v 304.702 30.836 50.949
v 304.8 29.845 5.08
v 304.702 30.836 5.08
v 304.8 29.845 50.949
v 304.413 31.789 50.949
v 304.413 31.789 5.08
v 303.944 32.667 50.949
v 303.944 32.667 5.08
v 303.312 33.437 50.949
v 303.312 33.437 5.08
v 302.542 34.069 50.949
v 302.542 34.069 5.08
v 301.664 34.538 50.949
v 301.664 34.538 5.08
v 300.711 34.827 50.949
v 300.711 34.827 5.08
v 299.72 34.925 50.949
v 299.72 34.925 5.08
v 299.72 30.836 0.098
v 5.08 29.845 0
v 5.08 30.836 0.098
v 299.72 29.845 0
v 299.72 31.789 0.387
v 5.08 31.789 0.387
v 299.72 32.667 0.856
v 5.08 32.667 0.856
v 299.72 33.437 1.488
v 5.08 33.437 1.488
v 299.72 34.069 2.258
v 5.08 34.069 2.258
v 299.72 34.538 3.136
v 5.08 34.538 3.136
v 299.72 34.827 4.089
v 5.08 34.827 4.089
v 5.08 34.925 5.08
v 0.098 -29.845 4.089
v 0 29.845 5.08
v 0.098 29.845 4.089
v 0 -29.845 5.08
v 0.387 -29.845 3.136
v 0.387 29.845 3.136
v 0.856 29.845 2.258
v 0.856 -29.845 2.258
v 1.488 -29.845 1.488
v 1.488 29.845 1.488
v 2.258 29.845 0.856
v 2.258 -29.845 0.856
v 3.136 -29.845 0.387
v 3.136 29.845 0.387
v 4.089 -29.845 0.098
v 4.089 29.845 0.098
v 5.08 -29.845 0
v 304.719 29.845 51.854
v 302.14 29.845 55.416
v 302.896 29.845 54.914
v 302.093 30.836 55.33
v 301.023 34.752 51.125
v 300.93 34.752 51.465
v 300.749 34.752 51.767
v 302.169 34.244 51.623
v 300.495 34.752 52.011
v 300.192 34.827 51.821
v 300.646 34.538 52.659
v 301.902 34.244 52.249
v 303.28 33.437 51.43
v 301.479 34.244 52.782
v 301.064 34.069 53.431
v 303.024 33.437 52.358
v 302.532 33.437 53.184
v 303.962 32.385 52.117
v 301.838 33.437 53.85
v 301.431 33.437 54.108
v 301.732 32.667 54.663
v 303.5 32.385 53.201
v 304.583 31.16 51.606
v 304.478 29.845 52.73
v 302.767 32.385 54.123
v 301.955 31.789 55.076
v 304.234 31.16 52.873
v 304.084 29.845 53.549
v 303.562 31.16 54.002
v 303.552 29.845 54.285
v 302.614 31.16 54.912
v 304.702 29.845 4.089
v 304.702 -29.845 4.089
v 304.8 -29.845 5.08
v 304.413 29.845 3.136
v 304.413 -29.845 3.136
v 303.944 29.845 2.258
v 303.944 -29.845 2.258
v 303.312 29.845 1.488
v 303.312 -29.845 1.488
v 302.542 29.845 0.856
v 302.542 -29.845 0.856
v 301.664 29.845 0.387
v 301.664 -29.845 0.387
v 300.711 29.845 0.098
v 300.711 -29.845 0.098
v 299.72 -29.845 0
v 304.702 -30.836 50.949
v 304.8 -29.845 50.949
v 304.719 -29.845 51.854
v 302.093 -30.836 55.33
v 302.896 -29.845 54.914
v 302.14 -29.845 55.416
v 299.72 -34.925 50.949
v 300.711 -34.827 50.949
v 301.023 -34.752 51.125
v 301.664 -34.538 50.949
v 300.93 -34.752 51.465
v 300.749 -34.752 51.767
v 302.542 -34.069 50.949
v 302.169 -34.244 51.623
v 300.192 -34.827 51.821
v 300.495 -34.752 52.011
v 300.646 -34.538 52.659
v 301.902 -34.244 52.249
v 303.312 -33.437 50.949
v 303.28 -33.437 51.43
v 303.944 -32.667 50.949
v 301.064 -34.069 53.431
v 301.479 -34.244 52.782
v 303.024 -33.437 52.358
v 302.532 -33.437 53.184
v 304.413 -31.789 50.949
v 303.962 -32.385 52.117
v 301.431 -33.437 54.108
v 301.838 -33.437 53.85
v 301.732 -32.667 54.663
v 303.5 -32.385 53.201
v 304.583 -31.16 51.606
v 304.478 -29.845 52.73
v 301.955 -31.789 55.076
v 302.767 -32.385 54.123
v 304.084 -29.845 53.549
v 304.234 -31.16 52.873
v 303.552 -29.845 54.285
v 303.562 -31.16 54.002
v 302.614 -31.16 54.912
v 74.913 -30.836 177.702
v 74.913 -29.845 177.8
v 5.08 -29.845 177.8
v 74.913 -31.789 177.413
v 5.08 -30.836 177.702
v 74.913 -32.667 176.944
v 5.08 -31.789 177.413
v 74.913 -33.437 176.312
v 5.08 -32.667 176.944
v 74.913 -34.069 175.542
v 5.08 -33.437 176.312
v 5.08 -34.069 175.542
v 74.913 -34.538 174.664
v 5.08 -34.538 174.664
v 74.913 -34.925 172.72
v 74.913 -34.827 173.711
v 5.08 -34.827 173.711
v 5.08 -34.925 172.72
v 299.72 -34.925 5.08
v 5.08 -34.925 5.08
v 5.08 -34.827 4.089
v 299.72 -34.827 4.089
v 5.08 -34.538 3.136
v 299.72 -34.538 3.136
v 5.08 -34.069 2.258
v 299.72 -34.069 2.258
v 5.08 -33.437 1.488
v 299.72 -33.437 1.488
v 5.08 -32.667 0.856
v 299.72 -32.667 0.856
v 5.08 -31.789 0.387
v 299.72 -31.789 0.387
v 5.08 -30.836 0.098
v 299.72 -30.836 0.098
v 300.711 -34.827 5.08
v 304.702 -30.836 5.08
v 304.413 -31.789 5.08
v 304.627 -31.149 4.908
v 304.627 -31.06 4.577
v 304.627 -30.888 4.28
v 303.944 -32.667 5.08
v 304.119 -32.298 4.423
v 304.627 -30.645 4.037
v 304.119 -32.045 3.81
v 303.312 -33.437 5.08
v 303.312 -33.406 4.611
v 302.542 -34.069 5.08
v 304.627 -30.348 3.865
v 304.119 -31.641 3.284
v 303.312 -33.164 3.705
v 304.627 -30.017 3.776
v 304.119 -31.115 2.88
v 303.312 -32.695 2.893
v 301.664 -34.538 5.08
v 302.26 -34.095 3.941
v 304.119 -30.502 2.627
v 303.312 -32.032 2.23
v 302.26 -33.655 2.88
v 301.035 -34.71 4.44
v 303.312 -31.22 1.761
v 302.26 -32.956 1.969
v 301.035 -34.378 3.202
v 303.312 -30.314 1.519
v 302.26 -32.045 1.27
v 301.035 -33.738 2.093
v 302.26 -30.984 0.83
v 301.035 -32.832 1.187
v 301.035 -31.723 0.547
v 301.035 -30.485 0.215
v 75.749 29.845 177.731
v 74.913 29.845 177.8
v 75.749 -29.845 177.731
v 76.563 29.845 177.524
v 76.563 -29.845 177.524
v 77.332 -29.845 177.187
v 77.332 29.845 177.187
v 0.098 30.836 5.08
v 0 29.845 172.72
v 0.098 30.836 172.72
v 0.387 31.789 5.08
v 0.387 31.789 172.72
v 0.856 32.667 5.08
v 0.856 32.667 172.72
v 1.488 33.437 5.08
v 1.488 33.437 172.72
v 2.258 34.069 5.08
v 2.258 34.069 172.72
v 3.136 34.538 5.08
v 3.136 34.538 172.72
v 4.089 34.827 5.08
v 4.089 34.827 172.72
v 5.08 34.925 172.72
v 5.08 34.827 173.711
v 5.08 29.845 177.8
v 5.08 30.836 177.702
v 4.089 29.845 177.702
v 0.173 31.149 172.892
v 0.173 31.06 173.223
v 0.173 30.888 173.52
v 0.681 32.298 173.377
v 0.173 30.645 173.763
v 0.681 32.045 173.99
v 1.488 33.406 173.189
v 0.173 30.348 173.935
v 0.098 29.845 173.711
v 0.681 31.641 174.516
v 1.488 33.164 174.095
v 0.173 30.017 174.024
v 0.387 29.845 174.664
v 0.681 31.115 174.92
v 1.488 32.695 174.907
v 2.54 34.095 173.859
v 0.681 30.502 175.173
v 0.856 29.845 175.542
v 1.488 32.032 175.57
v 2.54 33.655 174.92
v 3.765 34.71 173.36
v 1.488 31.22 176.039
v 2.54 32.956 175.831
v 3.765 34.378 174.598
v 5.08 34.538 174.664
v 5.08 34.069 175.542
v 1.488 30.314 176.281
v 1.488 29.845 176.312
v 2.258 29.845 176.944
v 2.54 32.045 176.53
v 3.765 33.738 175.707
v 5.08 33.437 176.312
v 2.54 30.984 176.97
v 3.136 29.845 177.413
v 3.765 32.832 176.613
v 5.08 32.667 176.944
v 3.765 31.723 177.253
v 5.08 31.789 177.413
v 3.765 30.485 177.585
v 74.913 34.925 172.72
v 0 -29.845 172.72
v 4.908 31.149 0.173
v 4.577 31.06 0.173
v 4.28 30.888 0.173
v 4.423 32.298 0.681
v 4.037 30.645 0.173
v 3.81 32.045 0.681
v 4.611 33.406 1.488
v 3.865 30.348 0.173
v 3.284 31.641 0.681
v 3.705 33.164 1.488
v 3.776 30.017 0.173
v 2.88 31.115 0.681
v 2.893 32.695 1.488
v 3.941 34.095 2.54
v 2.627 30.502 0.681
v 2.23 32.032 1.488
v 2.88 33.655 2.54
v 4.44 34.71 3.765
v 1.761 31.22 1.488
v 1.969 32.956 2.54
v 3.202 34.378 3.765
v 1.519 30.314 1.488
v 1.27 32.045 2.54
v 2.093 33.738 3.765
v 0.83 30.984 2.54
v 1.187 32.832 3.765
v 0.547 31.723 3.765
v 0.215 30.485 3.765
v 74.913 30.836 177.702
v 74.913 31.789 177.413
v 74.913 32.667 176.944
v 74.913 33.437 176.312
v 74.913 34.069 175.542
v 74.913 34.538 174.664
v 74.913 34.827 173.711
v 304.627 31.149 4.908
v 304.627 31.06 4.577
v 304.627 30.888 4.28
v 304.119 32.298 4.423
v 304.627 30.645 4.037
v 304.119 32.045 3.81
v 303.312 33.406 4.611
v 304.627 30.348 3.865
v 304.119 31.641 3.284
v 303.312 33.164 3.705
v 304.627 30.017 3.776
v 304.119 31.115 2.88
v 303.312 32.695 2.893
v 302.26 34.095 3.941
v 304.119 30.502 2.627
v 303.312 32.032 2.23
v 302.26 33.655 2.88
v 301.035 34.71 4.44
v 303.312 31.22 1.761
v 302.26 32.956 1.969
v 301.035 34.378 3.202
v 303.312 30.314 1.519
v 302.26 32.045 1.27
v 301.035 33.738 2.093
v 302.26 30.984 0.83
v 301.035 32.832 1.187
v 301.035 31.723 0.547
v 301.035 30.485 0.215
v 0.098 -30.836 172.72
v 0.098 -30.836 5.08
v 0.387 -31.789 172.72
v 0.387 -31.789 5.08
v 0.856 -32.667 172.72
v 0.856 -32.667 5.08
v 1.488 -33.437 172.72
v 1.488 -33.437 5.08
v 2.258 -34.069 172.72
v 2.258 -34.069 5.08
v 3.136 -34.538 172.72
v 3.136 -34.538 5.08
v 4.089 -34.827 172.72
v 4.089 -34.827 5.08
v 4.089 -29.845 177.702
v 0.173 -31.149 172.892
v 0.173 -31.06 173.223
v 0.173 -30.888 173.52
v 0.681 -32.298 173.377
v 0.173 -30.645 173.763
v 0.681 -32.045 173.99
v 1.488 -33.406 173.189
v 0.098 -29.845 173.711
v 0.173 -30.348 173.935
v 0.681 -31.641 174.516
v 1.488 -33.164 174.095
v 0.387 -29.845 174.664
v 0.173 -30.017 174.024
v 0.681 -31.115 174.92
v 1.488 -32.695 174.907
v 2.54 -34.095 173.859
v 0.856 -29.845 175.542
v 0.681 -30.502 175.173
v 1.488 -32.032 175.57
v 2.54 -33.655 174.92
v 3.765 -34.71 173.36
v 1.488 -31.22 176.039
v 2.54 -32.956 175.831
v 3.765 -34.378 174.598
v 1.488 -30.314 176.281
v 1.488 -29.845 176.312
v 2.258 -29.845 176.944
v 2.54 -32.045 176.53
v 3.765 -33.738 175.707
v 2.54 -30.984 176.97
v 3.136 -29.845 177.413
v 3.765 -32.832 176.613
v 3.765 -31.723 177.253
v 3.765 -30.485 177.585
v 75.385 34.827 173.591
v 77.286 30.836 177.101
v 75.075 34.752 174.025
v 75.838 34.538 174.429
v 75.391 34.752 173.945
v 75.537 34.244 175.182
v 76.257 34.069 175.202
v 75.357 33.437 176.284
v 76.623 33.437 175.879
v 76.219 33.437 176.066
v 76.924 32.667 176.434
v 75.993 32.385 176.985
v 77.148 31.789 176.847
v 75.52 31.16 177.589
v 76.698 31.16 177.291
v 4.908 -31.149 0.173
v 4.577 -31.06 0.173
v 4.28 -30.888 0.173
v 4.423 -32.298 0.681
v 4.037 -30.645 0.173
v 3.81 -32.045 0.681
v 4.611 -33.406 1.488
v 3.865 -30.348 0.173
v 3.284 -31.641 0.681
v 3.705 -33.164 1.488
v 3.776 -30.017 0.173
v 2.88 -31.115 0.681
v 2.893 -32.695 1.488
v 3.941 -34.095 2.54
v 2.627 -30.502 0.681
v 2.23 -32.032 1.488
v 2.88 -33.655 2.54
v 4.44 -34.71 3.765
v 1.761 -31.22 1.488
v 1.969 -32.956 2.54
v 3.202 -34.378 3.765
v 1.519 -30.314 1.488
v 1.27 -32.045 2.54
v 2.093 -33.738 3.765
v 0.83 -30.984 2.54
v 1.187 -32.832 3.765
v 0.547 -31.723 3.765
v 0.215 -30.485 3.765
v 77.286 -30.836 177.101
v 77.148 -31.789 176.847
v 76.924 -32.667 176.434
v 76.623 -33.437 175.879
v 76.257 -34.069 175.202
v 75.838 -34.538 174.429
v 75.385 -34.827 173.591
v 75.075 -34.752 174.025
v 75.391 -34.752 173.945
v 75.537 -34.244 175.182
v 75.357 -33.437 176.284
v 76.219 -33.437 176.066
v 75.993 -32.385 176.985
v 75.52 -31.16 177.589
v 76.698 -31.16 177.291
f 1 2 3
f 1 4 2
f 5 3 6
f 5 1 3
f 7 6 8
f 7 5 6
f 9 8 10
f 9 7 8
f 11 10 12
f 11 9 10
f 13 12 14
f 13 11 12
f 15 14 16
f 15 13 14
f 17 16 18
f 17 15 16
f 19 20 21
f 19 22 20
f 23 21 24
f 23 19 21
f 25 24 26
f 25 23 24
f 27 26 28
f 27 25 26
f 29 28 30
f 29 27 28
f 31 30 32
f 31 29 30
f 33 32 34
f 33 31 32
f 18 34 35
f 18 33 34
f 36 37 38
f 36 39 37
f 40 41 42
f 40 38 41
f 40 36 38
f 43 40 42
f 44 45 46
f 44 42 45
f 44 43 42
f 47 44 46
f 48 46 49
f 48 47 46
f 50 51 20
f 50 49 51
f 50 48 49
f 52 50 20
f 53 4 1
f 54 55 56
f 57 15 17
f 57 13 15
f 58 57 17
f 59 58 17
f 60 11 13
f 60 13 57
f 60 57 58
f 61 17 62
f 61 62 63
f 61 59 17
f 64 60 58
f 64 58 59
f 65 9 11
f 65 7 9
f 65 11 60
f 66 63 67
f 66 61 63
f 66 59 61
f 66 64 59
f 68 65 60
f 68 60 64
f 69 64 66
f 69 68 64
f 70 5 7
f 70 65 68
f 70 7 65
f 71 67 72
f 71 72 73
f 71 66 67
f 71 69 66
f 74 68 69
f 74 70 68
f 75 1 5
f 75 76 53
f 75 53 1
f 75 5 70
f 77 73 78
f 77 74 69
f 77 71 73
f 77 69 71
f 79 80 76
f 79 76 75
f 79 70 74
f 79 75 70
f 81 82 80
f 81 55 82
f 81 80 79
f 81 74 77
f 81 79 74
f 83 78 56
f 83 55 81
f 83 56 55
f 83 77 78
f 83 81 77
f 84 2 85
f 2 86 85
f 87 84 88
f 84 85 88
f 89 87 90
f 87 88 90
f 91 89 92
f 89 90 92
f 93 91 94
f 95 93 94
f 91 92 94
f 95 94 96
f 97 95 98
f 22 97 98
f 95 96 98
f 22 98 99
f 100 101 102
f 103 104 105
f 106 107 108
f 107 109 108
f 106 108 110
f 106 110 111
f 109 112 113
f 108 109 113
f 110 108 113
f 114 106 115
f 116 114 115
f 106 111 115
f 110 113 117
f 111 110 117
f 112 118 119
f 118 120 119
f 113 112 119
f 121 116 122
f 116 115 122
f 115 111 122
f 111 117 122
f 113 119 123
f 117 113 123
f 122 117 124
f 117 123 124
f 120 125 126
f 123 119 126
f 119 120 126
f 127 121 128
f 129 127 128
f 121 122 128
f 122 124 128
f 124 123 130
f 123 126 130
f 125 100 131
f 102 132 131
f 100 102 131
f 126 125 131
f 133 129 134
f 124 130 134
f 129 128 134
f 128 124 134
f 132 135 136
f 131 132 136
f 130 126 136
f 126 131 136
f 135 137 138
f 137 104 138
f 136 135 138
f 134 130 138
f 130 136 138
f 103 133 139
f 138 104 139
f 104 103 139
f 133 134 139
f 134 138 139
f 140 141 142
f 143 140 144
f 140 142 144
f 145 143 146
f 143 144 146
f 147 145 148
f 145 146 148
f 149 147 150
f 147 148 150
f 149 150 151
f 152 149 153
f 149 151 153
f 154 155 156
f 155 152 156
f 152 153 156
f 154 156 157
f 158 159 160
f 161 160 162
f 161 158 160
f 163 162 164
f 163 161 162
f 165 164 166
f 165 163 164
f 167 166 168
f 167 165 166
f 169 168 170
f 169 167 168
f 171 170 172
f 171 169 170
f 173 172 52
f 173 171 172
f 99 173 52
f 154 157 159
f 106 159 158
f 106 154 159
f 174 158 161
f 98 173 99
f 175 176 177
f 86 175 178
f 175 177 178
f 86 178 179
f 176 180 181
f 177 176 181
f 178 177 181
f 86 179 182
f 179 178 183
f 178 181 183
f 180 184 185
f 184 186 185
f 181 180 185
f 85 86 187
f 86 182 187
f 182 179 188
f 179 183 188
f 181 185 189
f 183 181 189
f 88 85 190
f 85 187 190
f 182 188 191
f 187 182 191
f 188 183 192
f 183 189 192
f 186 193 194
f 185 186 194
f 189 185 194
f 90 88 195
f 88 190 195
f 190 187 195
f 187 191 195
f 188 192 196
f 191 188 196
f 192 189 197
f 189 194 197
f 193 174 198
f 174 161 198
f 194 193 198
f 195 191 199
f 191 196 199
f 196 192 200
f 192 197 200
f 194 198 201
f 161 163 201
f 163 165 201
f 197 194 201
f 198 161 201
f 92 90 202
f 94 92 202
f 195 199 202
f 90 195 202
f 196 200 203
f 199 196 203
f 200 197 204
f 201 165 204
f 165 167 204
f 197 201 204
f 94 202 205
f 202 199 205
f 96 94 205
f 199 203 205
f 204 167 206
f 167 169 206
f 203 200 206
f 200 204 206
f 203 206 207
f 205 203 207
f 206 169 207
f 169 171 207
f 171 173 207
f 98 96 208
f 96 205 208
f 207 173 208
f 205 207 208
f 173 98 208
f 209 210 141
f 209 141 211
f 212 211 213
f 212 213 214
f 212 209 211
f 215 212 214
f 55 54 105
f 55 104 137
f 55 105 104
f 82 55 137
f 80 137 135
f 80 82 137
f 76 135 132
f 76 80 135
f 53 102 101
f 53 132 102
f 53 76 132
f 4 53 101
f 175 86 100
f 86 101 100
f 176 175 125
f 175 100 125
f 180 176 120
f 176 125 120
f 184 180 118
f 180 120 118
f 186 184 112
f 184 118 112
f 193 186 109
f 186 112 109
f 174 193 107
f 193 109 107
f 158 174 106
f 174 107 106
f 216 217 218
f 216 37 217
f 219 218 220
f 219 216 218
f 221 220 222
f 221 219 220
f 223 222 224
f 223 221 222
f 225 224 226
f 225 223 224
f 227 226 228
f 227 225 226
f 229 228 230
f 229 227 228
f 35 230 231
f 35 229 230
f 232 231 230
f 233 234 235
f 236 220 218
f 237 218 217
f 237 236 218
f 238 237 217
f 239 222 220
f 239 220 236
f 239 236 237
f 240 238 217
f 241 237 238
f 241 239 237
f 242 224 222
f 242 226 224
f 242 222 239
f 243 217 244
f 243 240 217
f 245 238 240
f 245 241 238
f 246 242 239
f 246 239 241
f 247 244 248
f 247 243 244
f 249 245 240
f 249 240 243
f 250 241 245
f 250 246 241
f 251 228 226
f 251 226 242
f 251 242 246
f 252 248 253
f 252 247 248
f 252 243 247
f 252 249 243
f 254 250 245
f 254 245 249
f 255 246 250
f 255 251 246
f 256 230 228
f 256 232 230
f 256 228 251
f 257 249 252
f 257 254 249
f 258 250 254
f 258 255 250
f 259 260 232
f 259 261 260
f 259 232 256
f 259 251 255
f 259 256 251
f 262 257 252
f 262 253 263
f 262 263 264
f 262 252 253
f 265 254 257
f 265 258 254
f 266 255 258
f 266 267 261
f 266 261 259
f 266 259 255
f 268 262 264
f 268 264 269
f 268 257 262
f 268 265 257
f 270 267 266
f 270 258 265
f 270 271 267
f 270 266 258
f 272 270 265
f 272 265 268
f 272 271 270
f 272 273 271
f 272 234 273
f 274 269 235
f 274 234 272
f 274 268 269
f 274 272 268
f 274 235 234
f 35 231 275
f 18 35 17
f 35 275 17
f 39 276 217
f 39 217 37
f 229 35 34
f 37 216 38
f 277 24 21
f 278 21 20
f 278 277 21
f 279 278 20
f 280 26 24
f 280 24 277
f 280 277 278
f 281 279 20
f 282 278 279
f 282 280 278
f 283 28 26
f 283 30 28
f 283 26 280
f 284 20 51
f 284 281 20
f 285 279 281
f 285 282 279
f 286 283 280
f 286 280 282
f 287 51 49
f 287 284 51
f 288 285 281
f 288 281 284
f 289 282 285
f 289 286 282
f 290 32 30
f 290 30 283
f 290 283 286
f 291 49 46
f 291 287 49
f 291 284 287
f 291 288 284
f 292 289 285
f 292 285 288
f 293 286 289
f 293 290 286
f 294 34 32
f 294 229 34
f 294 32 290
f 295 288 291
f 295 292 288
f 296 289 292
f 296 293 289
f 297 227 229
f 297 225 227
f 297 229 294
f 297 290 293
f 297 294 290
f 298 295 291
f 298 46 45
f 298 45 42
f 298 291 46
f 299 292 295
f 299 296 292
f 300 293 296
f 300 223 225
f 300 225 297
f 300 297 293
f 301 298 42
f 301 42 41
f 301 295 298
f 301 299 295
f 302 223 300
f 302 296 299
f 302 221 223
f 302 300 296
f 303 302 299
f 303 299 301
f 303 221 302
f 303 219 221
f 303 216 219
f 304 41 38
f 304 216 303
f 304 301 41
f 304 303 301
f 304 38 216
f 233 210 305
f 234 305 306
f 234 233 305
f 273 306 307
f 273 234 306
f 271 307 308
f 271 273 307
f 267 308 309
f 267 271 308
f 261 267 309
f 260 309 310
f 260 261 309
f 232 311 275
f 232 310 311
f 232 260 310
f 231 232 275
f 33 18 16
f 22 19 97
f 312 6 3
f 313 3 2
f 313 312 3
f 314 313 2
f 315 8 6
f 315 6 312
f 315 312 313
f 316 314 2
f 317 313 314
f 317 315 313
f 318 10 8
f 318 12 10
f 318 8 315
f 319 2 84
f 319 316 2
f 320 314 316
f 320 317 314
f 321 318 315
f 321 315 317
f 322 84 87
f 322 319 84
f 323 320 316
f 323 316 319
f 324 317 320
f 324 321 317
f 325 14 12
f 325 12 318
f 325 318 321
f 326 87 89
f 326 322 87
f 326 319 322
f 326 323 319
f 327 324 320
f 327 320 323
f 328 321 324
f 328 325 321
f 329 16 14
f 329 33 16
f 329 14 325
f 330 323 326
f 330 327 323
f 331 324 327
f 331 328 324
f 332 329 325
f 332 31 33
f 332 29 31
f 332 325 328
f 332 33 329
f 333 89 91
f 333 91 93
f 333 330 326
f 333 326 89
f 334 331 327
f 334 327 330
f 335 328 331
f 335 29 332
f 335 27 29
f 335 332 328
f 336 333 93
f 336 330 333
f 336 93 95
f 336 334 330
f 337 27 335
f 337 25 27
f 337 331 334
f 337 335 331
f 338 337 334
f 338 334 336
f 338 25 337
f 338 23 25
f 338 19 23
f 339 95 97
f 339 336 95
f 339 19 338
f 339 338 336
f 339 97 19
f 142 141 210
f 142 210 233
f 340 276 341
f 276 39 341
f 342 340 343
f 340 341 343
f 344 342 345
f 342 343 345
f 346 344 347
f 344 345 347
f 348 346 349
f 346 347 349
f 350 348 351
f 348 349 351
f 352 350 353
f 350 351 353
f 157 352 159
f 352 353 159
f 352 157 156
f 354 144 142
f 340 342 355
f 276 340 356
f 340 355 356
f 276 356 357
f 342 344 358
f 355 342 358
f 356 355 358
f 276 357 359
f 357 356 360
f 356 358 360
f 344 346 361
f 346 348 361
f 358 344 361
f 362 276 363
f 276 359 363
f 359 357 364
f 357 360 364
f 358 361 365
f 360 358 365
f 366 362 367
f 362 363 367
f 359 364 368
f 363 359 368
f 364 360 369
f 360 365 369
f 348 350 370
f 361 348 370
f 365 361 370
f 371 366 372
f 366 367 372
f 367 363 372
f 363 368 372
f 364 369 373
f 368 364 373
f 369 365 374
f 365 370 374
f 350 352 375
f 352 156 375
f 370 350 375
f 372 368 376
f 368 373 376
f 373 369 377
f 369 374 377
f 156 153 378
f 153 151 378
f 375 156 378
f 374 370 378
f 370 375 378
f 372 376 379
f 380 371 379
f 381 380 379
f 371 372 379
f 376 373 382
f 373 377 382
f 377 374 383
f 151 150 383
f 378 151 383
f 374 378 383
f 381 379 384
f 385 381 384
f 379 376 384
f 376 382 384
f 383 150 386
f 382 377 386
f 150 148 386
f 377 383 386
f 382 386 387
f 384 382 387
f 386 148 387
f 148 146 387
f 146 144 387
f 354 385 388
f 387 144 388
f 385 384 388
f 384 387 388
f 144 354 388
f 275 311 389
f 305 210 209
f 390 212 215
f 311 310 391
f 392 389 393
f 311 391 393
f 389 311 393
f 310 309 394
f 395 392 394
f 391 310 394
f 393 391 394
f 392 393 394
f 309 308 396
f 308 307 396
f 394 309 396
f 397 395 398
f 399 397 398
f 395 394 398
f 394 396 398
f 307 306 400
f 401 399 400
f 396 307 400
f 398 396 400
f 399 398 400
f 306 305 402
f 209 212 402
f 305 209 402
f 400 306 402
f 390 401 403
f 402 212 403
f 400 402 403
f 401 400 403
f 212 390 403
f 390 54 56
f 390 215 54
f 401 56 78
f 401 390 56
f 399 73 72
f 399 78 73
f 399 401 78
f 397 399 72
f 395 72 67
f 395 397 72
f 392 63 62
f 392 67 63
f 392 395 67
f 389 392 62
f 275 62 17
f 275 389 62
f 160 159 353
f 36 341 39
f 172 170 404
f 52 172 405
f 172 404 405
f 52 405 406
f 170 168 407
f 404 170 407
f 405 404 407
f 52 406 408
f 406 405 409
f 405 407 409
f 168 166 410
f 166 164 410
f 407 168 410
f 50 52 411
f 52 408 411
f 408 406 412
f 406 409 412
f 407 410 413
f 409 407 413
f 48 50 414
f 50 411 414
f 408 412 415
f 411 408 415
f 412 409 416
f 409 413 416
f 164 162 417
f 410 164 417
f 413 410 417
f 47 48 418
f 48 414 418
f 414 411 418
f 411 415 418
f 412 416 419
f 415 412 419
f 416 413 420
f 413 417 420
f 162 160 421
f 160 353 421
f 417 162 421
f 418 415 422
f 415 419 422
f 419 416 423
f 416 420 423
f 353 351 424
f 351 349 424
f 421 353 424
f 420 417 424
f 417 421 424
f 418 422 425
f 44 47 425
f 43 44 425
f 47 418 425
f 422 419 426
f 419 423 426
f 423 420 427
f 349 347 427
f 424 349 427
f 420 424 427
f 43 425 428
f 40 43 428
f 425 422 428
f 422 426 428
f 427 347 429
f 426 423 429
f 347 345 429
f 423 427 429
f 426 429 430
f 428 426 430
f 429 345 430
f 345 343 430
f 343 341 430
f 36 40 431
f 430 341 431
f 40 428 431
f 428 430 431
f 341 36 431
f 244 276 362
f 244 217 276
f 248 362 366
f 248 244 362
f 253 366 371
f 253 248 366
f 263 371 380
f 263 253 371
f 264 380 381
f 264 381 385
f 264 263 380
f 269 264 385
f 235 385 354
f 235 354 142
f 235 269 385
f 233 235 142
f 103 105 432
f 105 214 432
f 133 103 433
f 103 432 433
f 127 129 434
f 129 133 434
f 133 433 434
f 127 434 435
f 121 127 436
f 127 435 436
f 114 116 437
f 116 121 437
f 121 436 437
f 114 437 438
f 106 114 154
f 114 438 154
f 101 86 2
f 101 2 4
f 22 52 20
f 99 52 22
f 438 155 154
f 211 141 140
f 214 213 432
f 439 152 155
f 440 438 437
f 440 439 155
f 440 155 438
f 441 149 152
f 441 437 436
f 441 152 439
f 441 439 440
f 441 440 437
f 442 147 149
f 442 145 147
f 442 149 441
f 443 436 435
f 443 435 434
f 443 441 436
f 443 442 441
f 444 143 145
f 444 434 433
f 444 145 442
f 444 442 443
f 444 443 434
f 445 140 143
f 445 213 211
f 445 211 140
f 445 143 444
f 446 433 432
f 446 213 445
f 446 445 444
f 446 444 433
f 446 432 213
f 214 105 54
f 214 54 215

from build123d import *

# Parameters (mm, degrees)
F1_DEPTH = 34.925
F2_R     = 5.08


with BuildPart() as f1:
    # F0 (on Front) → F1 (new body, symmetric)
    with BuildSketch(Plane.XZ):
        Polygon((0, 177.8), (0, 0), (304.8, 0), (304.8, 53.975), (76.2, 177.8), align=None)
    extrude(amount=F1_DEPTH, both=True)

    # F2
    f2_edges = [f1.edges().sort_by_distance(p)[0] for p in [
        (38.1, -34.925, 177.8),
        (0, -34.925, 88.9),
        (152.4, -34.925, 0),
        (304.8, -34.925, 26.9875),
        (190.5, -34.925, 115.8875),
        (38.1, 34.925, 177.8),
        (0, 34.925, 88.9),
        (152.4, 34.925, 0),
        (304.8, 34.925, 26.9875),
        (190.5, 34.925, 115.8875),
        (0, 0, 177.8),
        (76.2, 0, 177.8),
        (304.8, 0, 53.975),
        (0, 0, 0),
        (304.8, 0, 0),
    ]]
    fillet(f2_edges, radius=F2_R)


solid = f1.part
